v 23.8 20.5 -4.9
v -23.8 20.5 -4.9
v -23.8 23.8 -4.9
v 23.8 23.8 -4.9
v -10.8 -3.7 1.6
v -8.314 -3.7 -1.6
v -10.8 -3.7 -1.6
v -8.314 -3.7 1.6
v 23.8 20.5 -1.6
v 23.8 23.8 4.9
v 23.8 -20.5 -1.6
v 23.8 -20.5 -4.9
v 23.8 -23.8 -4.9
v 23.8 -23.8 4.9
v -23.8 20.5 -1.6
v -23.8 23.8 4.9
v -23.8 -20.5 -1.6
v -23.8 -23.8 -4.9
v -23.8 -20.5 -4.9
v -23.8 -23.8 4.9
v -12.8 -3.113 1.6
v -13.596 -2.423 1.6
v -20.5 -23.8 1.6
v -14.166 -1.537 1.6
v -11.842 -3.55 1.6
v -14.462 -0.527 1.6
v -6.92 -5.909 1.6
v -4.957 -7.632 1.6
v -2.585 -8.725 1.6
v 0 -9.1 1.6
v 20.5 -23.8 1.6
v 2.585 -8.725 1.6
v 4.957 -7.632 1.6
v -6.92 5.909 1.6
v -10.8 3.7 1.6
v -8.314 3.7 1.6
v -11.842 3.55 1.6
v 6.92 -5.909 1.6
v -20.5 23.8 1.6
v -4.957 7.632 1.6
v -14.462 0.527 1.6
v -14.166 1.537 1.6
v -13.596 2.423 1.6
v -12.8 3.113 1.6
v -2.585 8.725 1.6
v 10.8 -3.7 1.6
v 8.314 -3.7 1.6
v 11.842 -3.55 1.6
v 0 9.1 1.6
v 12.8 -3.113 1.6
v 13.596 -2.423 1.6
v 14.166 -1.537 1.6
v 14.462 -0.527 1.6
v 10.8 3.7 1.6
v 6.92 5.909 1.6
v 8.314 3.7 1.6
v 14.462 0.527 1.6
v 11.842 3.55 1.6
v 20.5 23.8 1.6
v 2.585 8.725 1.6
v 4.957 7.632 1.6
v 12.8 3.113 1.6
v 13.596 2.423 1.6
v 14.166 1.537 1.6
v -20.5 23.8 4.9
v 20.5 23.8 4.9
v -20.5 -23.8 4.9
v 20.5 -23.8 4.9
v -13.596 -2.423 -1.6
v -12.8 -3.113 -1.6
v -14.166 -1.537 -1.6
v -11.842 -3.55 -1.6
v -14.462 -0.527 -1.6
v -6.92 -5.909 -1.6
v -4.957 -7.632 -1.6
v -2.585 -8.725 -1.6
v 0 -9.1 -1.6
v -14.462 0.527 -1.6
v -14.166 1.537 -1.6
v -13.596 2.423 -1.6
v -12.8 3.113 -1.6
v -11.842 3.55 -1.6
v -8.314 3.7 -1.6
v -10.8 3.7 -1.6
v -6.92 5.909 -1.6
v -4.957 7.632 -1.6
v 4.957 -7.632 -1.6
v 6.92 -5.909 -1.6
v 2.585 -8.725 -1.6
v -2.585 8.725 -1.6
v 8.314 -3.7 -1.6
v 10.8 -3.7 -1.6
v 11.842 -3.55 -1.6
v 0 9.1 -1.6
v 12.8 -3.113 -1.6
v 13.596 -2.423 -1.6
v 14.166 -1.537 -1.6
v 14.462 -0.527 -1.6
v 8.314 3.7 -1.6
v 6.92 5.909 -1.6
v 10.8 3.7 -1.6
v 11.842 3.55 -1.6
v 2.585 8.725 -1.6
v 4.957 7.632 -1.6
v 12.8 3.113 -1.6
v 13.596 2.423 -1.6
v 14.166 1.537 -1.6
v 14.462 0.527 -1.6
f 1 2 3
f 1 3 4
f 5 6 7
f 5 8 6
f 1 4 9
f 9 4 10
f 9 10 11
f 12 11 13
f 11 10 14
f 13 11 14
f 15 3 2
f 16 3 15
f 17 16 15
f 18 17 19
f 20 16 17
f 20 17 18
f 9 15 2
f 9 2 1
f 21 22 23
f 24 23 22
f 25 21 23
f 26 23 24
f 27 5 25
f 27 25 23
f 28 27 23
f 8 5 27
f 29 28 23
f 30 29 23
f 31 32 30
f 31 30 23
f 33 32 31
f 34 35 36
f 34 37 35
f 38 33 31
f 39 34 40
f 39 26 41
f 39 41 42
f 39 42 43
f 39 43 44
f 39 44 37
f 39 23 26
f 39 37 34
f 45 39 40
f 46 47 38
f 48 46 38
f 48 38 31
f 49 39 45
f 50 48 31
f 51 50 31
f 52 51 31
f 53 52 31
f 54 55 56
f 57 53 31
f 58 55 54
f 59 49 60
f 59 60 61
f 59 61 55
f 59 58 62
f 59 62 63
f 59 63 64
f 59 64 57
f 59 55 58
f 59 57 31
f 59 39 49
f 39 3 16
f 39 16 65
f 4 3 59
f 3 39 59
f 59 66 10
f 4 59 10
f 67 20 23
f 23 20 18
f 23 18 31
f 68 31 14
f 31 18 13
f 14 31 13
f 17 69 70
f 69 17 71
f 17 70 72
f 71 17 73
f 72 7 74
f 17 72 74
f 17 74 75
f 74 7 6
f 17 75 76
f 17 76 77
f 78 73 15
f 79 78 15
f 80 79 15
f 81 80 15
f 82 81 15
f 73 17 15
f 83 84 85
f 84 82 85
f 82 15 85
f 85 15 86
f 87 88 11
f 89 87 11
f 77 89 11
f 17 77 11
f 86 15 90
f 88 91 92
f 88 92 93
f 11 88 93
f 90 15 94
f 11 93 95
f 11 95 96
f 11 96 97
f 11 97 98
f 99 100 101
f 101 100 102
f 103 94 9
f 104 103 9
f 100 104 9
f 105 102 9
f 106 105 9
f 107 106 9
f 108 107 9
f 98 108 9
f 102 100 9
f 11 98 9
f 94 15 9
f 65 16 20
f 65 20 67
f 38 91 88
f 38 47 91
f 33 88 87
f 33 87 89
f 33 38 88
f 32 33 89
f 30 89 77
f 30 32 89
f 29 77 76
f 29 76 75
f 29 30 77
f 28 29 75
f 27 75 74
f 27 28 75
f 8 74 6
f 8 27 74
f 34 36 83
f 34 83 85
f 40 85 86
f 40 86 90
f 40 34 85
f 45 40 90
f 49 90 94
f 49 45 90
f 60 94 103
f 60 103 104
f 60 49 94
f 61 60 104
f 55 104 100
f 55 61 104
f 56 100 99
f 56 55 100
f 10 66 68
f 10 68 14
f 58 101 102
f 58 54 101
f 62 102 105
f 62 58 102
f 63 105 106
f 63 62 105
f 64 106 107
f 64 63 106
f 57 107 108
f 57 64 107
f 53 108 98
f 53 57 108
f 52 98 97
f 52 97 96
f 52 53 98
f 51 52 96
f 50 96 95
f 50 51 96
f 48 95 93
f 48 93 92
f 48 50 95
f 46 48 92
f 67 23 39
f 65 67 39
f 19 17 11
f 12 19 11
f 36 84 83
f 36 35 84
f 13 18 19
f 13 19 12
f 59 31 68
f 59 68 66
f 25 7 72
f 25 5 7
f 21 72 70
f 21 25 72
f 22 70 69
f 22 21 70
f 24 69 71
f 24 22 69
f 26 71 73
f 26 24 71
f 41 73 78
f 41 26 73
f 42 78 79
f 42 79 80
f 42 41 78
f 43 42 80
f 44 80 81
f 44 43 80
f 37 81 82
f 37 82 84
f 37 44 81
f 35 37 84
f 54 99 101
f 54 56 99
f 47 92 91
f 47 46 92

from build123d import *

# Parameters (mm, degrees)
F0_W     = 47.6
F0_H     = 47.6
F1_DEPTH = 1.6
F2_W     = 3.3
F2_H     = 47.6
F3_DEPTH = 3.3
F4_W     = 47.6
F4_H     = 3.3
F5_DEPTH = 3.3


with BuildPart() as f1:
    # F0 (on Top) → F1 (new body, symmetric)
    with BuildSketch(Plane.XY):
        Rectangle(F0_W, F0_H)
        with BuildLine():
            ThreePointArc((-8.313844, 3.7), (0, 9.1), (8.313844, 3.7))
            Line((8.313844, 3.7), (10.8, 3.7))
            ThreePointArc((10.8, 3.7), (14.5, 0), (10.8, -3.7))
            Line((10.8, -3.7), (8.313844, -3.7))
            ThreePointArc((8.313844, -3.7), (0, -9.1), (-8.313844, -3.7))
            Line((-8.313844, -3.7), (-10.8, -3.7))
            ThreePointArc((-10.8, -3.7), (-14.5, 0), (-10.8, 3.7))
            Line((-10.8, 3.7), (-8.313844, 3.7))
        make_face(mode=Mode.SUBTRACT)
    extrude(amount=F1_DEPTH, both=True)

    # F2 (on face) → F3 (join)
    with BuildSketch(Plane.XY.offset(1.6)):
        with Locations((-22.15, 0)):
            Rectangle(F2_W, F2_H)
        with Locations((22.15, 0)):
            Rectangle(F2_W, F2_H)
    extrude(amount=F3_DEPTH)

    # F4 (on face) → F5 (join)
    with BuildSketch(Plane(origin=(0, 0, -1.6), x_dir=(1, 0, 0), z_dir=(0, 0, -1))):
        with Locations((0, -22.15)):
            Rectangle(F4_W, F4_H)
        with Locations((0, 22.15)):
            Rectangle(F4_W, F4_H)
    extrude(amount=F5_DEPTH)


solid = f1.part
